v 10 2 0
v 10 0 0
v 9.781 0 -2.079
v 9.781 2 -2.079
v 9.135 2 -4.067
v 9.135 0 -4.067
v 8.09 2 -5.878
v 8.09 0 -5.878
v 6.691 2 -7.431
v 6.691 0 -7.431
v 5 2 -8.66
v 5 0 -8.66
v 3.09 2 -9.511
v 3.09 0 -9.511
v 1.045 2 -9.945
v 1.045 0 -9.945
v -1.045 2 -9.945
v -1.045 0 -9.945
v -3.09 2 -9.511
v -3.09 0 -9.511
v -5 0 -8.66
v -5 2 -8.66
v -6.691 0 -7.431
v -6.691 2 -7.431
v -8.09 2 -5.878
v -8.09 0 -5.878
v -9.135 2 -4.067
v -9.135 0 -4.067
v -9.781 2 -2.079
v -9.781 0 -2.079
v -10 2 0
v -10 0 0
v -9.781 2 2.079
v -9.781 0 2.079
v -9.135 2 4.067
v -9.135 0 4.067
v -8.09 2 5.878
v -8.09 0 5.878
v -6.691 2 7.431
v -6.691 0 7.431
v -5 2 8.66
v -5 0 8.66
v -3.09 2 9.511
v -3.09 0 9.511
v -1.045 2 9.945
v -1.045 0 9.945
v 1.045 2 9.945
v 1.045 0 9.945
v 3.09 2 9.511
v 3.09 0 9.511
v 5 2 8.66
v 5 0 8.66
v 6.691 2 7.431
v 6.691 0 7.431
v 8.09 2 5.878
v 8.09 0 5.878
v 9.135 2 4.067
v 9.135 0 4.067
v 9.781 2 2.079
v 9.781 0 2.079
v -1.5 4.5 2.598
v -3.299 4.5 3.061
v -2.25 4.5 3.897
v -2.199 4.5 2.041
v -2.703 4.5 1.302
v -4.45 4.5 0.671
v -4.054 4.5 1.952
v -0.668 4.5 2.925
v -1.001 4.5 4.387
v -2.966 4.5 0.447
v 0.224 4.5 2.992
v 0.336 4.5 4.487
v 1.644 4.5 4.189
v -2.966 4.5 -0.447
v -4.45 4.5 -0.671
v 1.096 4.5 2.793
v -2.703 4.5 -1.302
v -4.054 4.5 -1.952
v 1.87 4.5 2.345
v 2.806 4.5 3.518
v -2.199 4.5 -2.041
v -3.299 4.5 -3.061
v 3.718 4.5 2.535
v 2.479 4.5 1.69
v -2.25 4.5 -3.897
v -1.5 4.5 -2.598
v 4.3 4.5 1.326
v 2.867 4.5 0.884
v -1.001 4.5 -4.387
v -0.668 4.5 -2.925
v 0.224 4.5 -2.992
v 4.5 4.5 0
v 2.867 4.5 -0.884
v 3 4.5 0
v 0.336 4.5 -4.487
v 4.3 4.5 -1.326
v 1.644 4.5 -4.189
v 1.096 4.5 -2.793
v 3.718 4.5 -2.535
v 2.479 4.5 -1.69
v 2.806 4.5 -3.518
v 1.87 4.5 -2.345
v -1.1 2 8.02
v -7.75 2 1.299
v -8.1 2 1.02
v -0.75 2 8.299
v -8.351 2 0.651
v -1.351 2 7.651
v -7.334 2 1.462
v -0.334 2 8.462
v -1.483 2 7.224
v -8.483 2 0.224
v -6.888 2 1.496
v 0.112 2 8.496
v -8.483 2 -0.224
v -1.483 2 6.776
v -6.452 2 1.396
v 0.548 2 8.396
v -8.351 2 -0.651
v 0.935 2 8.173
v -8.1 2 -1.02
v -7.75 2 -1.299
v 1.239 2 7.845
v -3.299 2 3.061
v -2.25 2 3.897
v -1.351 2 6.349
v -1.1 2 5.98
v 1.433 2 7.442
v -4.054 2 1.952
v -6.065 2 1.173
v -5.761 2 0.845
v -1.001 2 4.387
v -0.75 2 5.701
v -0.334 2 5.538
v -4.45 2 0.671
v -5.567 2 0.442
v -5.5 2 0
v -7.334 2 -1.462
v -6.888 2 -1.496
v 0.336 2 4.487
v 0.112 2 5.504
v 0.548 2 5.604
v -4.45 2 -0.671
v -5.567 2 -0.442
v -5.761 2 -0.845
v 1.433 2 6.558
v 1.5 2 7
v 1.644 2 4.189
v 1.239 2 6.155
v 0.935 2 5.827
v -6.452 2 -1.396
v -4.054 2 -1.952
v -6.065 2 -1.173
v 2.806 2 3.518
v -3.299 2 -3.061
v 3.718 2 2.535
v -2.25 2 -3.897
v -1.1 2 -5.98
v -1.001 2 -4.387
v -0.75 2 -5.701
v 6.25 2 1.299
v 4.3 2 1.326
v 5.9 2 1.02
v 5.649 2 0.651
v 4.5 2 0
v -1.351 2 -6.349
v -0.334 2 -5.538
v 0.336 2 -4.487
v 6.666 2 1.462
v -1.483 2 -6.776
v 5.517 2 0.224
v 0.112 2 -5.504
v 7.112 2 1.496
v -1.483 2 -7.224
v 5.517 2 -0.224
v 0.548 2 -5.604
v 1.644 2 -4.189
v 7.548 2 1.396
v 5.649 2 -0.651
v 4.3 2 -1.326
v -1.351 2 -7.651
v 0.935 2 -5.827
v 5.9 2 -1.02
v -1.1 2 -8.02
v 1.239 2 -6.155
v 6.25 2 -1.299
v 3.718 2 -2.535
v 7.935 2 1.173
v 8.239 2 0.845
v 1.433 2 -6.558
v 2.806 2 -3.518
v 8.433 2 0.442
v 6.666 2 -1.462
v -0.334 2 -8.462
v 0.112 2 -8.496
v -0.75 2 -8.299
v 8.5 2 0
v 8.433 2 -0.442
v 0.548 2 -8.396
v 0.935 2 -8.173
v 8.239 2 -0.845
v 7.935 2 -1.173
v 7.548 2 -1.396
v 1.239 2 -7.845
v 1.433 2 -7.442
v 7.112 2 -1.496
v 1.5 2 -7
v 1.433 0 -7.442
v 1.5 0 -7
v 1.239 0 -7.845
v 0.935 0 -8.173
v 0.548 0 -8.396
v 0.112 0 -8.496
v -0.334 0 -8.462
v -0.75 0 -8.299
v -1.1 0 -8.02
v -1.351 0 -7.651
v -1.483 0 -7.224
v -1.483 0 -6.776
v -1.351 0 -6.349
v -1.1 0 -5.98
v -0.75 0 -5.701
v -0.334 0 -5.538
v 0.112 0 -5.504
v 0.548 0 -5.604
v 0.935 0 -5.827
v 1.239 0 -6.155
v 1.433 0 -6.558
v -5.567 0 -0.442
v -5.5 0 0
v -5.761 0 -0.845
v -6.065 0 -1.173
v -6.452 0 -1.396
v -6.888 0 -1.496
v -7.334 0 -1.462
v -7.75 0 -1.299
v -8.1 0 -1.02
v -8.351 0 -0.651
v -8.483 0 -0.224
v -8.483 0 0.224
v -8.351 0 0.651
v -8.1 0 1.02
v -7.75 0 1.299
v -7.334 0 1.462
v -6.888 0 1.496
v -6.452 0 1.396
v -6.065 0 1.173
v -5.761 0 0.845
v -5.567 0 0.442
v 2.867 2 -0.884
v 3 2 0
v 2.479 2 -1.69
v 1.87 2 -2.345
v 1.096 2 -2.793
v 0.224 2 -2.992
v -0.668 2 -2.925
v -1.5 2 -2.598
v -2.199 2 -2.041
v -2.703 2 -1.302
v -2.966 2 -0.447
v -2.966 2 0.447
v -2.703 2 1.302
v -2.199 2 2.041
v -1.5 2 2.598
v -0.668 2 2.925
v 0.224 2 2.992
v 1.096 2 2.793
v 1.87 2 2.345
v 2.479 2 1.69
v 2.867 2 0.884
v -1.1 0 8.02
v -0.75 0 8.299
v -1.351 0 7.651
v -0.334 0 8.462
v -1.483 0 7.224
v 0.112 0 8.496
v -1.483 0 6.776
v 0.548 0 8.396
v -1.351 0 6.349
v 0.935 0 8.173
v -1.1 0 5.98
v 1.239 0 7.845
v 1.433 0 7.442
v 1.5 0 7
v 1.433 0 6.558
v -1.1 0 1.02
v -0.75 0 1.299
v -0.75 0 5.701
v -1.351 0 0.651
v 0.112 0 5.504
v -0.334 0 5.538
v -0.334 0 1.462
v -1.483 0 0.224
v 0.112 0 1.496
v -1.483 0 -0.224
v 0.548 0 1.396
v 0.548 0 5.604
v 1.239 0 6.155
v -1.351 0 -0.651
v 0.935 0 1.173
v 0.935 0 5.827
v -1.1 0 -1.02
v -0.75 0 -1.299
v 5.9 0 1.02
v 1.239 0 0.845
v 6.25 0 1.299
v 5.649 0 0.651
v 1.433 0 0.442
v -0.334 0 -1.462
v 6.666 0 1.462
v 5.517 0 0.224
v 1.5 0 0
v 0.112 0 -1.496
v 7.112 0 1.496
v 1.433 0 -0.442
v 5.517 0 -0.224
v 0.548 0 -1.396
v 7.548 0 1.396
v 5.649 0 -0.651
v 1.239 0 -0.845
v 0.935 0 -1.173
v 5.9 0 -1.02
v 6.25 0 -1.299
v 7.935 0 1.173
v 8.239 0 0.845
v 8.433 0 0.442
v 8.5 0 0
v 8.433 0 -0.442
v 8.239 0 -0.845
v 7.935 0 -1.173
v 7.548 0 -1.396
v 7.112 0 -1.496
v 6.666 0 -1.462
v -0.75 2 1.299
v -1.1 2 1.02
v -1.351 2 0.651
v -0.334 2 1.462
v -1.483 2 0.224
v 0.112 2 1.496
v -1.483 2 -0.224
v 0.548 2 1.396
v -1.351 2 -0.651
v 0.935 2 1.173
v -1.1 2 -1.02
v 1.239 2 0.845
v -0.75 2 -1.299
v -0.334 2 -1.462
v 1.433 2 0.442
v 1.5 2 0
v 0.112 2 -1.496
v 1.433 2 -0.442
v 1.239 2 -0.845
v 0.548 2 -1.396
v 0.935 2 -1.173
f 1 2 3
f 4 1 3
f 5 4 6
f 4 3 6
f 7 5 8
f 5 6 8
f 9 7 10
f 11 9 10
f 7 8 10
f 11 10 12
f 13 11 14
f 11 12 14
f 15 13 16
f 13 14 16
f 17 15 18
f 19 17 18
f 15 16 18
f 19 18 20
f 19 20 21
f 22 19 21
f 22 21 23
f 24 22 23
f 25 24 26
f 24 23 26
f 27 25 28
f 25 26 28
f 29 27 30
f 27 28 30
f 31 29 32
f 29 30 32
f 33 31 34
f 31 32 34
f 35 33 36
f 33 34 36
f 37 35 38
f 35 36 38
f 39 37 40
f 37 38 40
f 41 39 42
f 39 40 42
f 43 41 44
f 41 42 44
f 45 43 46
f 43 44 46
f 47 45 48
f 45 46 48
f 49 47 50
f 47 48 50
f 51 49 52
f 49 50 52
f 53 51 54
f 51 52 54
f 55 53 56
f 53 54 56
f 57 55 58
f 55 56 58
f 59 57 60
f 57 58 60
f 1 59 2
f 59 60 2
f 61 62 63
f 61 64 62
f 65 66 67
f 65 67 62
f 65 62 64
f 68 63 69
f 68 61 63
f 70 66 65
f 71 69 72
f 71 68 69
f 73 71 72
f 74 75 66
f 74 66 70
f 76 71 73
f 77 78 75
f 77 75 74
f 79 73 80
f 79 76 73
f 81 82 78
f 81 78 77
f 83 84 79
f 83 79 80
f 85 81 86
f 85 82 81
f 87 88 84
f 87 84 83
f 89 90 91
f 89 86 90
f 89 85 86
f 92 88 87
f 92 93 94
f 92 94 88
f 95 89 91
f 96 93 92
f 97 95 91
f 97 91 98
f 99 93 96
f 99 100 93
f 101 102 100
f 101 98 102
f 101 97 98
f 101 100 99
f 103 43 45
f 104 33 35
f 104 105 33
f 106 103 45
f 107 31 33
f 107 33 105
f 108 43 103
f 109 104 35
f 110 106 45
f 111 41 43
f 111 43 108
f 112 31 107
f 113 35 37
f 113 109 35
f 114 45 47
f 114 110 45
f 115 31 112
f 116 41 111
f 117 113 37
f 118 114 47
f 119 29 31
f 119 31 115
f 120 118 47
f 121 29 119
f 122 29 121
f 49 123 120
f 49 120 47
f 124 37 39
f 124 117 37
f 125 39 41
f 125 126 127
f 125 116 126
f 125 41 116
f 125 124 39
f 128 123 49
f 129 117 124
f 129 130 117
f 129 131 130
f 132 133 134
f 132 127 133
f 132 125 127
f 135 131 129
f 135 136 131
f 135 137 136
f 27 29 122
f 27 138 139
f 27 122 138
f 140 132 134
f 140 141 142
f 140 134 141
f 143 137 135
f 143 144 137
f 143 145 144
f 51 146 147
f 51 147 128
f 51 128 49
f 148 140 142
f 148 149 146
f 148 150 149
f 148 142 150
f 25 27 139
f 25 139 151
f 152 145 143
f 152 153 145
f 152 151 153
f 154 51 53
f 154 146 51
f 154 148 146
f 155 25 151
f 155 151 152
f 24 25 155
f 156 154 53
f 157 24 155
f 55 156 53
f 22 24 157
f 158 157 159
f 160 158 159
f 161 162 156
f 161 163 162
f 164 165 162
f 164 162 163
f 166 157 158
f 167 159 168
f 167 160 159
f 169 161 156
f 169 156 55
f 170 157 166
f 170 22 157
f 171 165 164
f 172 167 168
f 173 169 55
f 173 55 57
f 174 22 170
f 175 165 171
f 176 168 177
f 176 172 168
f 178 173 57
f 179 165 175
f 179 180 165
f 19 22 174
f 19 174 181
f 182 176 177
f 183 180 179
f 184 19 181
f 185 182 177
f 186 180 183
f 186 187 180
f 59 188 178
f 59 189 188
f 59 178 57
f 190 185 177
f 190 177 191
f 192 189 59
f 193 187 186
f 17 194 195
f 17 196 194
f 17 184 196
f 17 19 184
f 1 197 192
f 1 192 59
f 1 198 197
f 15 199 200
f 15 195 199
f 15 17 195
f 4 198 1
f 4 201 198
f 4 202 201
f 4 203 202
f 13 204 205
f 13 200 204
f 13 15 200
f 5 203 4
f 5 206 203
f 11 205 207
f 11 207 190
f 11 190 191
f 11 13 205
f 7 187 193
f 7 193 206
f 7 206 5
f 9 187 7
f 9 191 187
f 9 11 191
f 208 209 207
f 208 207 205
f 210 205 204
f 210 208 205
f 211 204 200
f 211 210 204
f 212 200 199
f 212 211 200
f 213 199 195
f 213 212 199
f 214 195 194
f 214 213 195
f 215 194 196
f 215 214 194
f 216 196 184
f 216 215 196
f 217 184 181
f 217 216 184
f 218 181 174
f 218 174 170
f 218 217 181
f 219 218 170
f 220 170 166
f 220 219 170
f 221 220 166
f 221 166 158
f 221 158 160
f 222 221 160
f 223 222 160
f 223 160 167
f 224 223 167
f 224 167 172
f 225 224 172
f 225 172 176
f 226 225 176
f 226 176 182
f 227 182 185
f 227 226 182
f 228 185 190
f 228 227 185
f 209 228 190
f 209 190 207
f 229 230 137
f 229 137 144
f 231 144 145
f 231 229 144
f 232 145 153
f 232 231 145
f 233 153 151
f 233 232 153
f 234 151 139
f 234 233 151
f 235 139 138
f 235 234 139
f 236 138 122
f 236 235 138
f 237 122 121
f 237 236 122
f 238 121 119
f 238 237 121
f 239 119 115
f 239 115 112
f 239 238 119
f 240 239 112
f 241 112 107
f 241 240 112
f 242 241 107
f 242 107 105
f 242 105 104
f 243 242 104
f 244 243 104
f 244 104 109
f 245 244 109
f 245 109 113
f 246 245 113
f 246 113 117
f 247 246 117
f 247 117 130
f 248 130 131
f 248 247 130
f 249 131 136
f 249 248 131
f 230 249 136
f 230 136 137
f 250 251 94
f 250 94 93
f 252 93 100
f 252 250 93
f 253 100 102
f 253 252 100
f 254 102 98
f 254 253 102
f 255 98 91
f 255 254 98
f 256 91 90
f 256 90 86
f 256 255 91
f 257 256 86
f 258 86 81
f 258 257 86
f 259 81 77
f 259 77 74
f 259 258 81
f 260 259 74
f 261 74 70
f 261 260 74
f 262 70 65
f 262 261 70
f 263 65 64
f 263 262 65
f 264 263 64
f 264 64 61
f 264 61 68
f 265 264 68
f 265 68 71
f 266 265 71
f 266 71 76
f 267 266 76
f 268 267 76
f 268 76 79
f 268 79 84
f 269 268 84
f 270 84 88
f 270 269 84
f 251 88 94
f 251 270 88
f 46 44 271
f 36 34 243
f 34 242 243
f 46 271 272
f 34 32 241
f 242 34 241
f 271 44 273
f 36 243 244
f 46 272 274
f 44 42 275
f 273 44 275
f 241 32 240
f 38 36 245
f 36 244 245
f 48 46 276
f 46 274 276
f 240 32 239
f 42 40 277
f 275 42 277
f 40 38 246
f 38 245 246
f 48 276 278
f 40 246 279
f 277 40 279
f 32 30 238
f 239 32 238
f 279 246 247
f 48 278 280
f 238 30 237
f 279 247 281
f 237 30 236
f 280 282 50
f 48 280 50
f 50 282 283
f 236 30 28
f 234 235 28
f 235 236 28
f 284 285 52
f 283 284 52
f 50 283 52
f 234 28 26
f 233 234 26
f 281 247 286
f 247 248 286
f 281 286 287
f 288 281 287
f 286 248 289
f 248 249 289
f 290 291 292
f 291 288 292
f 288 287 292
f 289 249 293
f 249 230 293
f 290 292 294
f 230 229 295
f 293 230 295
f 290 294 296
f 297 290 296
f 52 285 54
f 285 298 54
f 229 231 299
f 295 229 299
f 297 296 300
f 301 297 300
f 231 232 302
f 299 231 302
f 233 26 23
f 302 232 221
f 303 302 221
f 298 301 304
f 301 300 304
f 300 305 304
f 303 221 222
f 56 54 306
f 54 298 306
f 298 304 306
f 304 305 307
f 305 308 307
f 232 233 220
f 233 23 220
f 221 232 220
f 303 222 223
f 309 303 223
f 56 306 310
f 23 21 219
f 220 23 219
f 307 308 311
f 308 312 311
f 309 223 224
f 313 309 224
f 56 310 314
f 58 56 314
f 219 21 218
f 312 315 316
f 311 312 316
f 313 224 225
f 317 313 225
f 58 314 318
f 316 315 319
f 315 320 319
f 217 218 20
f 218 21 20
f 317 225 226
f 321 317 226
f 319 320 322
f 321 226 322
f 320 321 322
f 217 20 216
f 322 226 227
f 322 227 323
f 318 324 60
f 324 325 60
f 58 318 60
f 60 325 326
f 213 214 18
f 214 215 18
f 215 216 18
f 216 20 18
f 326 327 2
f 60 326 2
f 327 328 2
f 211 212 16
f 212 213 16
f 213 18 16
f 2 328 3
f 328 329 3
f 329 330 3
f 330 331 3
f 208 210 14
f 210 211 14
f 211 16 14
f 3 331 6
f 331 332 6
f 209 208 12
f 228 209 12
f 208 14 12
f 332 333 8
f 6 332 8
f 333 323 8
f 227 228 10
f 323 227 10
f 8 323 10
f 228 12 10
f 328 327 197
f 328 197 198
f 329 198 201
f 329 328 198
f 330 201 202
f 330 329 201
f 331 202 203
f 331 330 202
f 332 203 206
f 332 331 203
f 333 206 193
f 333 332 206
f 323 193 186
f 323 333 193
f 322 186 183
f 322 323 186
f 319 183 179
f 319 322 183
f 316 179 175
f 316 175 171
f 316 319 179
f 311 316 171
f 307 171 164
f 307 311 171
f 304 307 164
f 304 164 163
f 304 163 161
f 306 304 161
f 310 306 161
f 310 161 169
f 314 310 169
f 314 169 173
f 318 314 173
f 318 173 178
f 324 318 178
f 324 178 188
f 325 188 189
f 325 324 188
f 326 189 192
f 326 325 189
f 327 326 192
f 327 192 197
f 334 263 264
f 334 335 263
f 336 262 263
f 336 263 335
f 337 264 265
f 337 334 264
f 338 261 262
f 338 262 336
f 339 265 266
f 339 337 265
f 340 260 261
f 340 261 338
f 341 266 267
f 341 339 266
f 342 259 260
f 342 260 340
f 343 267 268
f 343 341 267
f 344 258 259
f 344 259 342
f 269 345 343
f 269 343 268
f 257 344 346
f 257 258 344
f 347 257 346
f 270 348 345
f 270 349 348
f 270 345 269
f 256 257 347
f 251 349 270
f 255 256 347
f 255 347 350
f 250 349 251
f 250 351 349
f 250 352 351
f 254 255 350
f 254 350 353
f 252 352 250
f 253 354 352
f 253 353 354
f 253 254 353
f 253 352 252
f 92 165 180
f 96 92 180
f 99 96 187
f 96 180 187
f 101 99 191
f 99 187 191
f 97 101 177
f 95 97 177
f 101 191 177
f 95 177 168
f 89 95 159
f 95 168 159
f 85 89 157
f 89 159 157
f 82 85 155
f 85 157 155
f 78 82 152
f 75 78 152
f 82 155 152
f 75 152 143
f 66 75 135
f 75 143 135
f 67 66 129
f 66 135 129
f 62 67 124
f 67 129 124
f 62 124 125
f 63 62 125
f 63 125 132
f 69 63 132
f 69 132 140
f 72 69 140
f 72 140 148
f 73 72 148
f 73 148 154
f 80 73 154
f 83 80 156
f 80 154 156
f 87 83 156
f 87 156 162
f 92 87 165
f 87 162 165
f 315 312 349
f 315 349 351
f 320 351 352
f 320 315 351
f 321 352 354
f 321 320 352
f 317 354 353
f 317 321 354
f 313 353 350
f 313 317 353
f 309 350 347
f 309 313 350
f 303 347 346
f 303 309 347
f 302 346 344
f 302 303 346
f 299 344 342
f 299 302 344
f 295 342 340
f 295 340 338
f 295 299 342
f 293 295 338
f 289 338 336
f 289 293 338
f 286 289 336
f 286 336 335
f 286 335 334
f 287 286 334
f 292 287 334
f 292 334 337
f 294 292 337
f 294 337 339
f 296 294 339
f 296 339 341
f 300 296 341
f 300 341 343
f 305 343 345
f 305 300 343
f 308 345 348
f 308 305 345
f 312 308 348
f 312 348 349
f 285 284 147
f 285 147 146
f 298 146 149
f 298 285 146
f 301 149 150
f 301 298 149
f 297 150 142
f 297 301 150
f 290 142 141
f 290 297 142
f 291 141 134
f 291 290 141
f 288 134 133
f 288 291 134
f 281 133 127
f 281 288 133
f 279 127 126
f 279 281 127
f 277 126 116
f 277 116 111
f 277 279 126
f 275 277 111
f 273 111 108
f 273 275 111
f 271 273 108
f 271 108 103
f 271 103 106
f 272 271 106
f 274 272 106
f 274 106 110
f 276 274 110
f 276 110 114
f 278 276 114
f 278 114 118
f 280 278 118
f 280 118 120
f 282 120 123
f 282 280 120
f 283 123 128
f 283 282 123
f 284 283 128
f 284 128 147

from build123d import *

# Parameters (mm, degrees)
SKETCH1_R           = 10
SKETCH1_R_2         = 1.5
BOSS_EXTRUDE1_DEPTH = 2
SKETCH2_R           = 4.5
SKETCH2_R_2         = 3
BOSS_EXTRUDE2_DEPTH = 2.5


with BuildPart() as part:
    # Sketch1 → Boss-Extrude1 (new body)
    with BuildSketch(Plane(origin=(0, 0, 0), x_dir=(1, 0, 0), z_dir=(0, 1, 0))):
        Circle(SKETCH1_R)
        with Locations((0, -7)):
            Circle(SKETCH1_R_2, mode=Mode.SUBTRACT)
        with Locations((-7, 0)):
            Circle(SKETCH1_R_2, mode=Mode.SUBTRACT)
        with Locations((0, 7)):
            Circle(SKETCH1_R_2, mode=Mode.SUBTRACT)
        with Locations((7, 0)):
            Circle(SKETCH1_R_2, mode=Mode.SUBTRACT)
        Circle(SKETCH1_R_2, mode=Mode.SUBTRACT)
    extrude(amount=BOSS_EXTRUDE1_DEPTH)

    # Sketch2 → Boss-Extrude2 (add)
    with BuildSketch(Plane(origin=(0, 2, 0), x_dir=(1, 0, 0), z_dir=(0, 1, 0))):
        Circle(SKETCH2_R)
        Circle(SKETCH2_R_2, mode=Mode.SUBTRACT)
    extrude(amount=BOSS_EXTRUDE2_DEPTH)


solid = part.part
